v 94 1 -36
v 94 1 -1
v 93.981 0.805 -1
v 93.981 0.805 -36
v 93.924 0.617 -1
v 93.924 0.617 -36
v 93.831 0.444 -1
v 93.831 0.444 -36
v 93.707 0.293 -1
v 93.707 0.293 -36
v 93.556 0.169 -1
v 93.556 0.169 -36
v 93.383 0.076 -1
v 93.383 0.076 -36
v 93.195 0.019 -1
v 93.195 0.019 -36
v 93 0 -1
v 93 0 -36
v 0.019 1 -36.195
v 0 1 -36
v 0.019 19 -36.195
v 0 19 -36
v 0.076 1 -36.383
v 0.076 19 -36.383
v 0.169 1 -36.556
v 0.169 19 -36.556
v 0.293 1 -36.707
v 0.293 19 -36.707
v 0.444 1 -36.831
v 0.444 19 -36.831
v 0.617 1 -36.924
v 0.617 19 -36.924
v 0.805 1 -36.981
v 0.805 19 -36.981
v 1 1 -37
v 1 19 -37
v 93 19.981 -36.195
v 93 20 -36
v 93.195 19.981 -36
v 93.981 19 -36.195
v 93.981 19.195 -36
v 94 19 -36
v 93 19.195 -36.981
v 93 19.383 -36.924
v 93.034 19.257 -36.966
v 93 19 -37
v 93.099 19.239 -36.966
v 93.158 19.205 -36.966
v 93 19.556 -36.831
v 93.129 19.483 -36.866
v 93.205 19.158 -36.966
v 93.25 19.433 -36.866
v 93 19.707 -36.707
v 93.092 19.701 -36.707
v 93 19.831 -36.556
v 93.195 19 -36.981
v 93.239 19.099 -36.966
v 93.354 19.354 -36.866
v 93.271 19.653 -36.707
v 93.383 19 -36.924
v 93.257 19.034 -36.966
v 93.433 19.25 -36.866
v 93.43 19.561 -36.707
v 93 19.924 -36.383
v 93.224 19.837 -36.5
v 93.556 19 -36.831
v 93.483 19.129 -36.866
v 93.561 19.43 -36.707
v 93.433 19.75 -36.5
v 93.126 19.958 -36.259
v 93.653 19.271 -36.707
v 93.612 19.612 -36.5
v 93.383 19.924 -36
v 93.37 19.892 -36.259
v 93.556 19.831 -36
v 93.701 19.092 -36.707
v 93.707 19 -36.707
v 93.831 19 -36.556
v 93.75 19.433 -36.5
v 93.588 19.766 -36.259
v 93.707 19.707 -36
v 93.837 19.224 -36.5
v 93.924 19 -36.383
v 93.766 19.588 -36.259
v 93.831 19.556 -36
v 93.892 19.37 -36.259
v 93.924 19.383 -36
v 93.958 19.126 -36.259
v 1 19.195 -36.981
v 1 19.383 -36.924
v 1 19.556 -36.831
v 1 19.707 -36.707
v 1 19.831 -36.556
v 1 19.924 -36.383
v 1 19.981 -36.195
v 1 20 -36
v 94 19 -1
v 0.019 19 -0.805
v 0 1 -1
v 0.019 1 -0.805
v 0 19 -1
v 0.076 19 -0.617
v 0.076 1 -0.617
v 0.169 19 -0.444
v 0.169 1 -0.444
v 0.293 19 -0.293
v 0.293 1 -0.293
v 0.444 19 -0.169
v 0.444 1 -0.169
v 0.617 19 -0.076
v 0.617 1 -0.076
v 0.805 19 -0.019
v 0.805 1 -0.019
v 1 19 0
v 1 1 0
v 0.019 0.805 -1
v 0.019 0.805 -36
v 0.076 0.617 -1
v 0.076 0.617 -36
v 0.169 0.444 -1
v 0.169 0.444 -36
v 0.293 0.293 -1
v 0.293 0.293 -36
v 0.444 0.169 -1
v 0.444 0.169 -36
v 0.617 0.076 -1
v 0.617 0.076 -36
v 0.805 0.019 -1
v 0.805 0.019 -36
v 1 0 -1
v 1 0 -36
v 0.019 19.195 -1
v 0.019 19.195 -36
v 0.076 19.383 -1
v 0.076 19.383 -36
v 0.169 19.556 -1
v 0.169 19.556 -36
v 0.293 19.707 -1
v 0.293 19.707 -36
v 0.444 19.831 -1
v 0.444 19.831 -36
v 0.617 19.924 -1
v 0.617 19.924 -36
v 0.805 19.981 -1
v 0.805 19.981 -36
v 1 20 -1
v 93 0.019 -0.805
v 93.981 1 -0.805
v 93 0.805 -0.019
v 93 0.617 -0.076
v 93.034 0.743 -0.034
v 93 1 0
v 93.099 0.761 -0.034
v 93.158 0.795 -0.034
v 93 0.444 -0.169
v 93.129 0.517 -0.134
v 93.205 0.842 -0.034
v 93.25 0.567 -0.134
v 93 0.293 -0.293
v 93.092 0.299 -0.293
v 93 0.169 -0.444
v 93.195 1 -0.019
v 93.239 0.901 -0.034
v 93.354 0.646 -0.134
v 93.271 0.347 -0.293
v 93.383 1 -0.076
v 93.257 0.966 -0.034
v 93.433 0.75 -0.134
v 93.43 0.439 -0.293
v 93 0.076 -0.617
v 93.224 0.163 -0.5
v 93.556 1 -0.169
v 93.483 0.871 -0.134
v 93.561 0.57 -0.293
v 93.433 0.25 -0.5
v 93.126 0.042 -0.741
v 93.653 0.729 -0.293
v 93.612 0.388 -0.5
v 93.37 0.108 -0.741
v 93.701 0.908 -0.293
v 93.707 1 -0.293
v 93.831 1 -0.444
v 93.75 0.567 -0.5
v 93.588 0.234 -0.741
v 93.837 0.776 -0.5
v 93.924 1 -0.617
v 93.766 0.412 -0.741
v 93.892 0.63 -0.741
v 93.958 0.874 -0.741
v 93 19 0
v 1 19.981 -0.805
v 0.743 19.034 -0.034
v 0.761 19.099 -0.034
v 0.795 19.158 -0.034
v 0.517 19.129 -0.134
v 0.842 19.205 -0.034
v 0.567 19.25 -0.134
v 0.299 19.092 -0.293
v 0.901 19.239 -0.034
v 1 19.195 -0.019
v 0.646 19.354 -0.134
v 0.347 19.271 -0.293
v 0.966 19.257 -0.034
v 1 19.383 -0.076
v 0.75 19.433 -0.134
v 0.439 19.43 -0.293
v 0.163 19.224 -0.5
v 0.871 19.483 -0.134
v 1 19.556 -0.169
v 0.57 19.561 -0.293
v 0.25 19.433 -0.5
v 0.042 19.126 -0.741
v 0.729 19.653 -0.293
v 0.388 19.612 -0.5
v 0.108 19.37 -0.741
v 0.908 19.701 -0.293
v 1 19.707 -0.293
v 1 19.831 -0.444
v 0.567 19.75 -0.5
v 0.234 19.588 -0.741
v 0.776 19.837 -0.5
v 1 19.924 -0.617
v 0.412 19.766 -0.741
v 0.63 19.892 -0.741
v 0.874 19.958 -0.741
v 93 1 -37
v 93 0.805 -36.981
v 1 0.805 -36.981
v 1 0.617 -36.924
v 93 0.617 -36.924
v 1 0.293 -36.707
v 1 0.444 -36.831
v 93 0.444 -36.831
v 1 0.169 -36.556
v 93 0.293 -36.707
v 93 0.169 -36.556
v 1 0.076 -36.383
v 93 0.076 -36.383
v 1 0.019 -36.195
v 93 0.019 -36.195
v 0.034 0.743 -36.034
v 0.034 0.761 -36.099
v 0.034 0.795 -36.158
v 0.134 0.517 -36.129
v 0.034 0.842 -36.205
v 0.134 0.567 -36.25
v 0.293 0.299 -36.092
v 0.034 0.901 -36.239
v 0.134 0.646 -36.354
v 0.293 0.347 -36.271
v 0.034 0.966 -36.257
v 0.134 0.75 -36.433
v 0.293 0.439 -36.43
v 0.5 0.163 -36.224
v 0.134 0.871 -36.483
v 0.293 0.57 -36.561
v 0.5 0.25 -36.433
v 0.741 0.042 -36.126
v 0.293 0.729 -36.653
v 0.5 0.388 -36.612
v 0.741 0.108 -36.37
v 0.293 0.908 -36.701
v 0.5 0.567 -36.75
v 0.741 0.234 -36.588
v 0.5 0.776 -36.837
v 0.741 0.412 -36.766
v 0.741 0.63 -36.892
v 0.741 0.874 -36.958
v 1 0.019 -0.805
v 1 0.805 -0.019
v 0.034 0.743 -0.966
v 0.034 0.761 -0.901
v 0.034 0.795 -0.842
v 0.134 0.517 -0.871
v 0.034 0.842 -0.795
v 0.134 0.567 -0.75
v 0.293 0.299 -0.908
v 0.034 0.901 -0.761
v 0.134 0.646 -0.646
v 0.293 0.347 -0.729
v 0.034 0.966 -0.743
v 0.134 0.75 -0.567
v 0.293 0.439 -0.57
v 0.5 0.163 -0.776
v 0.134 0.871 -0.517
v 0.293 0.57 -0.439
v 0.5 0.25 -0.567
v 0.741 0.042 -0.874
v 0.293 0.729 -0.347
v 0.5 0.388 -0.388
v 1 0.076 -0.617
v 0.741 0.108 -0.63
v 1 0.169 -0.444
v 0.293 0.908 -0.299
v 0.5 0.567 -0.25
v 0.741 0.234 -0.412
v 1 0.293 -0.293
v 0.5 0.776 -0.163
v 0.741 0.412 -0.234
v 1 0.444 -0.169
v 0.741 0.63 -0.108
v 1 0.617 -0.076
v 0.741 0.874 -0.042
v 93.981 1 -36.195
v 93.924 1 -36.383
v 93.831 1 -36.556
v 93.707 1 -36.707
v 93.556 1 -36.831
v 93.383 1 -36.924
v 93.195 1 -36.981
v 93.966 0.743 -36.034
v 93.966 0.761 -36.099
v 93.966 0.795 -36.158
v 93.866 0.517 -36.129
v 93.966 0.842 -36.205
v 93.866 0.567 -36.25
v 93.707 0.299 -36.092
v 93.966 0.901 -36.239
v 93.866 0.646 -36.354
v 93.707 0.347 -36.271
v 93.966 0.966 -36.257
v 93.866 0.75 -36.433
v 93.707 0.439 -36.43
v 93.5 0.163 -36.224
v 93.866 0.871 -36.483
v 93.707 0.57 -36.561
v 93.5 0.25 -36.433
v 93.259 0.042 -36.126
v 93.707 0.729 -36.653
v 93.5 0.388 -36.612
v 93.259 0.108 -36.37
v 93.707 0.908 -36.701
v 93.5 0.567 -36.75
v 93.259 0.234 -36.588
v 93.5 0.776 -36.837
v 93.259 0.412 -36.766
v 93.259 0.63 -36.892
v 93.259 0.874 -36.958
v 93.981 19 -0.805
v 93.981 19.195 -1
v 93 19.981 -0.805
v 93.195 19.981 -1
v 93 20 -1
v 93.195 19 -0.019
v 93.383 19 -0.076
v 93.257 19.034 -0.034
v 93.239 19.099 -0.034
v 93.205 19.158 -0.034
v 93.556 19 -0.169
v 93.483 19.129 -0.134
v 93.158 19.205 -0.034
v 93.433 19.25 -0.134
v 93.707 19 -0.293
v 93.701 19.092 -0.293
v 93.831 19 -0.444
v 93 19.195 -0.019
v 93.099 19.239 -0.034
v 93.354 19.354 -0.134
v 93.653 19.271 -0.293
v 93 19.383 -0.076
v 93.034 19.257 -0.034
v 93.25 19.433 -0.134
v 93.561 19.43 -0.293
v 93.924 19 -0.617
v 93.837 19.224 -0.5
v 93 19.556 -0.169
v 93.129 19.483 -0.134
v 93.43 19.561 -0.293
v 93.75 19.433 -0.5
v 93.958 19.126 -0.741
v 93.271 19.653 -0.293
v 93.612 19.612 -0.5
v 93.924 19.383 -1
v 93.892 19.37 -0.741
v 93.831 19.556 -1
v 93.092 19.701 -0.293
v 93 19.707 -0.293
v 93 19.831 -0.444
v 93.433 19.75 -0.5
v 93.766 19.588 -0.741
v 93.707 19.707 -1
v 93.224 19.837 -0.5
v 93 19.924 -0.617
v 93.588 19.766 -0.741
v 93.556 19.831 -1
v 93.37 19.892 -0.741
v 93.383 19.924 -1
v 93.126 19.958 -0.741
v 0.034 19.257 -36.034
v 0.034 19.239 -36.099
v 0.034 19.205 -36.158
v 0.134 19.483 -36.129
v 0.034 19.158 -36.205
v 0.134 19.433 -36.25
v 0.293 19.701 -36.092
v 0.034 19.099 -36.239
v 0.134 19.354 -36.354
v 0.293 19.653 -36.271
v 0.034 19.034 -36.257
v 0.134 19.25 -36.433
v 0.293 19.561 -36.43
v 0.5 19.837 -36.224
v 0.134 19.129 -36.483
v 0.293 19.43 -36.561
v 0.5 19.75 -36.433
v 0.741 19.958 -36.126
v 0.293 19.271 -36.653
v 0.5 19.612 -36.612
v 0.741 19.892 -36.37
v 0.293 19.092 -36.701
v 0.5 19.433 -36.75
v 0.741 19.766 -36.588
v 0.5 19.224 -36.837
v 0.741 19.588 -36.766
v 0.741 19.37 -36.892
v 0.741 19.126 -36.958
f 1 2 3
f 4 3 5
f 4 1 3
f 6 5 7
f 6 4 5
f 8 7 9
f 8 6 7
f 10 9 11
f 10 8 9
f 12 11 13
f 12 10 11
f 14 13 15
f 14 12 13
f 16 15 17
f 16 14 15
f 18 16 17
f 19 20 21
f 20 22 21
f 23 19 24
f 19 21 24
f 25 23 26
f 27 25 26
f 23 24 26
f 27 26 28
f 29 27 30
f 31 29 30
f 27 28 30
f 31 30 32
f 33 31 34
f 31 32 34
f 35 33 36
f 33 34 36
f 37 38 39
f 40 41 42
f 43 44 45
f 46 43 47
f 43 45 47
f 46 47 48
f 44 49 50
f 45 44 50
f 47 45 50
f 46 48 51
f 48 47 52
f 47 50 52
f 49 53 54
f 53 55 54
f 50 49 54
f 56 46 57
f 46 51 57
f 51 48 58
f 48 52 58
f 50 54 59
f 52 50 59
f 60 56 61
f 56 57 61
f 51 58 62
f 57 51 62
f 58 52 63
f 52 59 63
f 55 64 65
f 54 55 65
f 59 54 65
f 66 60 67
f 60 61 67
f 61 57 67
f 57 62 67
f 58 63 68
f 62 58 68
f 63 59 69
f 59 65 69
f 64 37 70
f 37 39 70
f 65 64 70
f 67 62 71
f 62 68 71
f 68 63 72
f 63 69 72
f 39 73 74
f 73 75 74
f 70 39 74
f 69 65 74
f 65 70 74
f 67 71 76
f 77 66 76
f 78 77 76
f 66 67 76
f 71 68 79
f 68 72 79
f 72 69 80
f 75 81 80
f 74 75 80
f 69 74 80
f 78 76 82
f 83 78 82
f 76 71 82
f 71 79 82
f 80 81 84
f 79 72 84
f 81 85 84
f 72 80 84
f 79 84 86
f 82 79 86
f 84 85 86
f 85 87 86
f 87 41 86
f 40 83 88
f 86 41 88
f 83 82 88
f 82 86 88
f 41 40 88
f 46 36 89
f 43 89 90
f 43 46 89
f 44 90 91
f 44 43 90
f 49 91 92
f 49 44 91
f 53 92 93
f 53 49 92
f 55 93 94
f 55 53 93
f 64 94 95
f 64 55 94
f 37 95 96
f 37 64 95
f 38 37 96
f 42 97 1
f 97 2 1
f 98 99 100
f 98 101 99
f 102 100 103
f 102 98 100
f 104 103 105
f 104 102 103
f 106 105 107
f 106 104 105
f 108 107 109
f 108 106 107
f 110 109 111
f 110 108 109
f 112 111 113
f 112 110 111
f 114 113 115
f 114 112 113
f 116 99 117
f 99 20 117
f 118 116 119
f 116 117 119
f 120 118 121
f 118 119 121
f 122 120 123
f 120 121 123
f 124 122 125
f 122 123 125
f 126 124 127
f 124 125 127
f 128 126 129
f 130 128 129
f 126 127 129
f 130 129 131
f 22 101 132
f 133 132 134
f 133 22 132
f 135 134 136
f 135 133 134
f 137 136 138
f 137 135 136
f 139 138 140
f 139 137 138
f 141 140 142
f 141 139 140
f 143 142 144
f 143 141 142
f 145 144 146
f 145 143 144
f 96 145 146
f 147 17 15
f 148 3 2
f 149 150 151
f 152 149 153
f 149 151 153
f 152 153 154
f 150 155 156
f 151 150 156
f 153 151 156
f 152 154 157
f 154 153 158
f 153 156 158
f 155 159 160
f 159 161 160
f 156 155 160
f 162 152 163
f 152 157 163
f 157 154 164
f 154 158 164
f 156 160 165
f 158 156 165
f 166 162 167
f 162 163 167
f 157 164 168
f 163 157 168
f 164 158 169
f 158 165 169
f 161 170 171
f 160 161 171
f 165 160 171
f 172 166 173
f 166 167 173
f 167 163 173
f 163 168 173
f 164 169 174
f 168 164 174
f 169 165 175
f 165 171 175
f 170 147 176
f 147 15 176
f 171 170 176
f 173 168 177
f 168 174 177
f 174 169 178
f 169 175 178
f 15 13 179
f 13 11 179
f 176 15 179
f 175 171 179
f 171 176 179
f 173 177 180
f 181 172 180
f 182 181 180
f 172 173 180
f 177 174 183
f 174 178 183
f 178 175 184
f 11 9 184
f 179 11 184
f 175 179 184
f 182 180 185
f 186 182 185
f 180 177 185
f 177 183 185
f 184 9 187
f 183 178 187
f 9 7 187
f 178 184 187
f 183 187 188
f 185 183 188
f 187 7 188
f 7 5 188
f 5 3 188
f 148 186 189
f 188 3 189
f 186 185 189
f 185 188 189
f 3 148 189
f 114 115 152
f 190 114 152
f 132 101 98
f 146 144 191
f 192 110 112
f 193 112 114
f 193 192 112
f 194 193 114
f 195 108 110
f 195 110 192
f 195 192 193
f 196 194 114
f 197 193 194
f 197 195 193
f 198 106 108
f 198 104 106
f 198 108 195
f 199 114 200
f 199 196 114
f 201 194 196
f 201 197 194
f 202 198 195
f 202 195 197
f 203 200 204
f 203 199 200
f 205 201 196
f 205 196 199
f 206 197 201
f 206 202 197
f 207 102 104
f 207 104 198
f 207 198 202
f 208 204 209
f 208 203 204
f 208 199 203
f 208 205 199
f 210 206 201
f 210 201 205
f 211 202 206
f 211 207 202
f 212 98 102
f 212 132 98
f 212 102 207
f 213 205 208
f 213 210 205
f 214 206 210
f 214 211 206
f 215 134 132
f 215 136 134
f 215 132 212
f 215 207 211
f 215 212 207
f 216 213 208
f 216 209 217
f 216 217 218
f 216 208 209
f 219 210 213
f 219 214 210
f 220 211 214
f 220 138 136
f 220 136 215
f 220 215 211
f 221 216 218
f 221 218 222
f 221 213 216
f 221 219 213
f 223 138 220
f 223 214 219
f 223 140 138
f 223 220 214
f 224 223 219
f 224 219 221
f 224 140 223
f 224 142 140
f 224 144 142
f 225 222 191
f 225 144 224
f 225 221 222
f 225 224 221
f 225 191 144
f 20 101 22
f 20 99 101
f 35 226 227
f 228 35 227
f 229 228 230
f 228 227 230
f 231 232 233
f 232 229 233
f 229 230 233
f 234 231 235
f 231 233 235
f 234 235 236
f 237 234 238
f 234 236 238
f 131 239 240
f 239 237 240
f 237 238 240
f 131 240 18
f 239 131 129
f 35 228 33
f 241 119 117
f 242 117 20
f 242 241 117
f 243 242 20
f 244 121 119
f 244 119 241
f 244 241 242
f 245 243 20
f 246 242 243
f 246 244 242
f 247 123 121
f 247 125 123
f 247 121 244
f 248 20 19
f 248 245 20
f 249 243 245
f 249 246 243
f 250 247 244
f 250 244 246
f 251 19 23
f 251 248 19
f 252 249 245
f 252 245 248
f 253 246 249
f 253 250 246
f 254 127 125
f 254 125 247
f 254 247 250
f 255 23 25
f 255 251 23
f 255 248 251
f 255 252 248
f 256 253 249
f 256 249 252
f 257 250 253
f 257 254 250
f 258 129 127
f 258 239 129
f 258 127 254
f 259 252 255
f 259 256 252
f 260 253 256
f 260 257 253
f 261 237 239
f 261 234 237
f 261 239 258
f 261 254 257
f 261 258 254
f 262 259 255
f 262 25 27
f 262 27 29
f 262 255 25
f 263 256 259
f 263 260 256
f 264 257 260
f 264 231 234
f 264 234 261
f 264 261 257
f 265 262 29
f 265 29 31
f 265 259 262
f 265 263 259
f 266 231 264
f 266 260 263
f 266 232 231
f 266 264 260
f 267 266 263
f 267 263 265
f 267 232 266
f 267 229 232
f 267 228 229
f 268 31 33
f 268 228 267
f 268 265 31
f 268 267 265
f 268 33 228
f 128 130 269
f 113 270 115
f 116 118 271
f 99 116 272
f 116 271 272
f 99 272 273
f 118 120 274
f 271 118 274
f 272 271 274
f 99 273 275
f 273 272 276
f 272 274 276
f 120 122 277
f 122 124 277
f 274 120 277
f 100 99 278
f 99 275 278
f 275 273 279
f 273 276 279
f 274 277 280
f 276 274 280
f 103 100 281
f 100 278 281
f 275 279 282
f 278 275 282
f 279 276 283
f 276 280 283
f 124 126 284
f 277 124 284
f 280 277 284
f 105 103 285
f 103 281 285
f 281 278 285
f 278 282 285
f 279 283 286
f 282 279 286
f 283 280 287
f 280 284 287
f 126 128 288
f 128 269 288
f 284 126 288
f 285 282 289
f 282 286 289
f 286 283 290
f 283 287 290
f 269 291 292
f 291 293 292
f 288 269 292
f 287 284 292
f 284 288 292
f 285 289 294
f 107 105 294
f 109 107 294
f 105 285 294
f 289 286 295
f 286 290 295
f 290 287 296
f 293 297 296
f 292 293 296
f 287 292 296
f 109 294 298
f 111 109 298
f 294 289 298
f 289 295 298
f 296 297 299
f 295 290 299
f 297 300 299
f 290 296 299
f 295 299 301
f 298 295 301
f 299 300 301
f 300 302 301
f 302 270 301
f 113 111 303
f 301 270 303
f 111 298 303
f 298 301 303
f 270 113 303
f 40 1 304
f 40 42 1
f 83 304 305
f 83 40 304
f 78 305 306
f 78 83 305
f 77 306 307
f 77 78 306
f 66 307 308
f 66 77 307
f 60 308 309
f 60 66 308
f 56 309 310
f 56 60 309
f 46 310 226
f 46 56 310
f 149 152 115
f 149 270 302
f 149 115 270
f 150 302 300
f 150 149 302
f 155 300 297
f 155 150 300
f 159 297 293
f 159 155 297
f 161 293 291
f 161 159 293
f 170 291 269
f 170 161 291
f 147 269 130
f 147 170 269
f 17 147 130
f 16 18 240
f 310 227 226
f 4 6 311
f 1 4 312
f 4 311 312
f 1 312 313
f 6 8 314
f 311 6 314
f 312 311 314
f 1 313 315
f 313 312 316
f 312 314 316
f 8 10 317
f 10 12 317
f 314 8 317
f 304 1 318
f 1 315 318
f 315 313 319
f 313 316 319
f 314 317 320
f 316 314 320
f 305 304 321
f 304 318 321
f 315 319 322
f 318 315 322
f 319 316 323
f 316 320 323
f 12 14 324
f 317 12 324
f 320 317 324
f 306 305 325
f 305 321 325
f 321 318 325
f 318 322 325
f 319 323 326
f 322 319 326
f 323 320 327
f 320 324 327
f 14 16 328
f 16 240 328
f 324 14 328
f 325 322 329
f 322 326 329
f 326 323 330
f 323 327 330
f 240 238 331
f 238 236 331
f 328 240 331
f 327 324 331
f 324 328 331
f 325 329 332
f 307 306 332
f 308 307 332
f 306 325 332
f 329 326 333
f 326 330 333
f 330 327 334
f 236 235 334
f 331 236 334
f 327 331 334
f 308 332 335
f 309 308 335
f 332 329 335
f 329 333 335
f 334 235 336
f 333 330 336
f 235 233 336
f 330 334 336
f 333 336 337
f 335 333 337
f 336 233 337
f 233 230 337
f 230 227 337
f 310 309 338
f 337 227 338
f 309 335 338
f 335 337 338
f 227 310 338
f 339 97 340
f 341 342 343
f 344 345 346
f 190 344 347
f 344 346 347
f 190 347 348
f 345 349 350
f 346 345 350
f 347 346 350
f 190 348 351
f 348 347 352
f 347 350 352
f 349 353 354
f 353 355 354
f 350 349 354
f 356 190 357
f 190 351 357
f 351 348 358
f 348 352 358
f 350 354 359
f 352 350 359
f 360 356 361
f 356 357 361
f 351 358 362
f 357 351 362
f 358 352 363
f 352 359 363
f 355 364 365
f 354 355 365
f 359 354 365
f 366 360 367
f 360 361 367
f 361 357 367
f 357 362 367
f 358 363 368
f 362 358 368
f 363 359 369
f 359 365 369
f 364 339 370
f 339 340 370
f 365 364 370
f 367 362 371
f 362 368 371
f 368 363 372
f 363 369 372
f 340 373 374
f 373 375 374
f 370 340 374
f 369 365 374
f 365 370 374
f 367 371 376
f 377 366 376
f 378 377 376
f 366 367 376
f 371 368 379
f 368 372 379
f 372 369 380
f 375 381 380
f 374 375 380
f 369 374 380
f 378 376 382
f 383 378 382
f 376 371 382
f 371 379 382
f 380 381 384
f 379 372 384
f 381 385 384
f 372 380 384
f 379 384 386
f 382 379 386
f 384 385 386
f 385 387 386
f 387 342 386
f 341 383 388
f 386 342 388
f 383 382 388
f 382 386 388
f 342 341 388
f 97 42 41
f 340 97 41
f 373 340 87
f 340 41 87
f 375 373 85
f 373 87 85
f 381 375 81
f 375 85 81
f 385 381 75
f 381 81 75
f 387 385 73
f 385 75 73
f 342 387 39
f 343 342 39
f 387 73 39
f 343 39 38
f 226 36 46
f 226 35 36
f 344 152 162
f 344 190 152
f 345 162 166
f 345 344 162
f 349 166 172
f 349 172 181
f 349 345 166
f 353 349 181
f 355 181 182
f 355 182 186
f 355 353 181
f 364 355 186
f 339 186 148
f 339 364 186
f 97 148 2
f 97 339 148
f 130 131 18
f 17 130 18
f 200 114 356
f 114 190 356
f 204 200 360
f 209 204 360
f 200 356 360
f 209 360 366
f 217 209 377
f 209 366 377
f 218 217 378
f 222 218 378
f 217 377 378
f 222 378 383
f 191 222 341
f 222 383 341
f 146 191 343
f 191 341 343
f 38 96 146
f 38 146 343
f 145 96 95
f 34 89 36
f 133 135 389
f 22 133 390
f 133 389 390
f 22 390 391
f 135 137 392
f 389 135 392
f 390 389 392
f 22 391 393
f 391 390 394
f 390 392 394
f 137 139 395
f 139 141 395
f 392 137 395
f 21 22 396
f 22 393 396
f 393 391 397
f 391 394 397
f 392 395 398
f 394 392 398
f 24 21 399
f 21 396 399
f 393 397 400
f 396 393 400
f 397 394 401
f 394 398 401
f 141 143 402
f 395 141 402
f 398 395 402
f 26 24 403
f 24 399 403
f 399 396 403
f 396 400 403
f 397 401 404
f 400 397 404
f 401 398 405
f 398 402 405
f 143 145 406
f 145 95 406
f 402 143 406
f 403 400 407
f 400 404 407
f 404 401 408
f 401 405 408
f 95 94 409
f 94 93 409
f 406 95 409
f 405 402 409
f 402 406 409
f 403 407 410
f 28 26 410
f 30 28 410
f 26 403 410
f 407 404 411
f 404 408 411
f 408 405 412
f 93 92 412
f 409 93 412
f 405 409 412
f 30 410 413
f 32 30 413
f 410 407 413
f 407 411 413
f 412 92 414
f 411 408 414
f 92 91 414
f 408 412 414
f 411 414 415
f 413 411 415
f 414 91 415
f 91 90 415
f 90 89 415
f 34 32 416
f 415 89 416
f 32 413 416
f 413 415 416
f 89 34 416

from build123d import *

# Parameters (mm, degrees)
CROQUIS1_W              = 94
CROQUIS1_H              = 37
SALIENTE_EXTRUIR1_DEPTH = 20
REDONDEO1_R             = 1


with BuildPart() as part:
    # Croquis1 → Saliente-Extruir1 (new body)
    with BuildSketch(Plane(origin=(0, 0, 0), x_dir=(1, 0, 0), z_dir=(0, 1, 0))):
        with Locations((47, 18.5)):
            Rectangle(CROQUIS1_W, CROQUIS1_H)
    extrude(amount=SALIENTE_EXTRUIR1_DEPTH)

    # Redondeo1
    redondeo1_edges = [part.edges().sort_by_distance(p)[0] for p in [
        (94, 20, -18.5),
        (47, 20, -37),
        (0, 20, -18.5),
        (47, 0, -37),
        (94, 0, -18.5),
        (47, 0, 0),
        (0, 0, -18.5),
        (0, 10, -37),
        (94, 10, -37),
        (94, 10, 0),
        (0, 10, 0),
        (47, 20, 0),
    ]]
    fillet(redondeo1_edges, radius=REDONDEO1_R)


solid = part.part
